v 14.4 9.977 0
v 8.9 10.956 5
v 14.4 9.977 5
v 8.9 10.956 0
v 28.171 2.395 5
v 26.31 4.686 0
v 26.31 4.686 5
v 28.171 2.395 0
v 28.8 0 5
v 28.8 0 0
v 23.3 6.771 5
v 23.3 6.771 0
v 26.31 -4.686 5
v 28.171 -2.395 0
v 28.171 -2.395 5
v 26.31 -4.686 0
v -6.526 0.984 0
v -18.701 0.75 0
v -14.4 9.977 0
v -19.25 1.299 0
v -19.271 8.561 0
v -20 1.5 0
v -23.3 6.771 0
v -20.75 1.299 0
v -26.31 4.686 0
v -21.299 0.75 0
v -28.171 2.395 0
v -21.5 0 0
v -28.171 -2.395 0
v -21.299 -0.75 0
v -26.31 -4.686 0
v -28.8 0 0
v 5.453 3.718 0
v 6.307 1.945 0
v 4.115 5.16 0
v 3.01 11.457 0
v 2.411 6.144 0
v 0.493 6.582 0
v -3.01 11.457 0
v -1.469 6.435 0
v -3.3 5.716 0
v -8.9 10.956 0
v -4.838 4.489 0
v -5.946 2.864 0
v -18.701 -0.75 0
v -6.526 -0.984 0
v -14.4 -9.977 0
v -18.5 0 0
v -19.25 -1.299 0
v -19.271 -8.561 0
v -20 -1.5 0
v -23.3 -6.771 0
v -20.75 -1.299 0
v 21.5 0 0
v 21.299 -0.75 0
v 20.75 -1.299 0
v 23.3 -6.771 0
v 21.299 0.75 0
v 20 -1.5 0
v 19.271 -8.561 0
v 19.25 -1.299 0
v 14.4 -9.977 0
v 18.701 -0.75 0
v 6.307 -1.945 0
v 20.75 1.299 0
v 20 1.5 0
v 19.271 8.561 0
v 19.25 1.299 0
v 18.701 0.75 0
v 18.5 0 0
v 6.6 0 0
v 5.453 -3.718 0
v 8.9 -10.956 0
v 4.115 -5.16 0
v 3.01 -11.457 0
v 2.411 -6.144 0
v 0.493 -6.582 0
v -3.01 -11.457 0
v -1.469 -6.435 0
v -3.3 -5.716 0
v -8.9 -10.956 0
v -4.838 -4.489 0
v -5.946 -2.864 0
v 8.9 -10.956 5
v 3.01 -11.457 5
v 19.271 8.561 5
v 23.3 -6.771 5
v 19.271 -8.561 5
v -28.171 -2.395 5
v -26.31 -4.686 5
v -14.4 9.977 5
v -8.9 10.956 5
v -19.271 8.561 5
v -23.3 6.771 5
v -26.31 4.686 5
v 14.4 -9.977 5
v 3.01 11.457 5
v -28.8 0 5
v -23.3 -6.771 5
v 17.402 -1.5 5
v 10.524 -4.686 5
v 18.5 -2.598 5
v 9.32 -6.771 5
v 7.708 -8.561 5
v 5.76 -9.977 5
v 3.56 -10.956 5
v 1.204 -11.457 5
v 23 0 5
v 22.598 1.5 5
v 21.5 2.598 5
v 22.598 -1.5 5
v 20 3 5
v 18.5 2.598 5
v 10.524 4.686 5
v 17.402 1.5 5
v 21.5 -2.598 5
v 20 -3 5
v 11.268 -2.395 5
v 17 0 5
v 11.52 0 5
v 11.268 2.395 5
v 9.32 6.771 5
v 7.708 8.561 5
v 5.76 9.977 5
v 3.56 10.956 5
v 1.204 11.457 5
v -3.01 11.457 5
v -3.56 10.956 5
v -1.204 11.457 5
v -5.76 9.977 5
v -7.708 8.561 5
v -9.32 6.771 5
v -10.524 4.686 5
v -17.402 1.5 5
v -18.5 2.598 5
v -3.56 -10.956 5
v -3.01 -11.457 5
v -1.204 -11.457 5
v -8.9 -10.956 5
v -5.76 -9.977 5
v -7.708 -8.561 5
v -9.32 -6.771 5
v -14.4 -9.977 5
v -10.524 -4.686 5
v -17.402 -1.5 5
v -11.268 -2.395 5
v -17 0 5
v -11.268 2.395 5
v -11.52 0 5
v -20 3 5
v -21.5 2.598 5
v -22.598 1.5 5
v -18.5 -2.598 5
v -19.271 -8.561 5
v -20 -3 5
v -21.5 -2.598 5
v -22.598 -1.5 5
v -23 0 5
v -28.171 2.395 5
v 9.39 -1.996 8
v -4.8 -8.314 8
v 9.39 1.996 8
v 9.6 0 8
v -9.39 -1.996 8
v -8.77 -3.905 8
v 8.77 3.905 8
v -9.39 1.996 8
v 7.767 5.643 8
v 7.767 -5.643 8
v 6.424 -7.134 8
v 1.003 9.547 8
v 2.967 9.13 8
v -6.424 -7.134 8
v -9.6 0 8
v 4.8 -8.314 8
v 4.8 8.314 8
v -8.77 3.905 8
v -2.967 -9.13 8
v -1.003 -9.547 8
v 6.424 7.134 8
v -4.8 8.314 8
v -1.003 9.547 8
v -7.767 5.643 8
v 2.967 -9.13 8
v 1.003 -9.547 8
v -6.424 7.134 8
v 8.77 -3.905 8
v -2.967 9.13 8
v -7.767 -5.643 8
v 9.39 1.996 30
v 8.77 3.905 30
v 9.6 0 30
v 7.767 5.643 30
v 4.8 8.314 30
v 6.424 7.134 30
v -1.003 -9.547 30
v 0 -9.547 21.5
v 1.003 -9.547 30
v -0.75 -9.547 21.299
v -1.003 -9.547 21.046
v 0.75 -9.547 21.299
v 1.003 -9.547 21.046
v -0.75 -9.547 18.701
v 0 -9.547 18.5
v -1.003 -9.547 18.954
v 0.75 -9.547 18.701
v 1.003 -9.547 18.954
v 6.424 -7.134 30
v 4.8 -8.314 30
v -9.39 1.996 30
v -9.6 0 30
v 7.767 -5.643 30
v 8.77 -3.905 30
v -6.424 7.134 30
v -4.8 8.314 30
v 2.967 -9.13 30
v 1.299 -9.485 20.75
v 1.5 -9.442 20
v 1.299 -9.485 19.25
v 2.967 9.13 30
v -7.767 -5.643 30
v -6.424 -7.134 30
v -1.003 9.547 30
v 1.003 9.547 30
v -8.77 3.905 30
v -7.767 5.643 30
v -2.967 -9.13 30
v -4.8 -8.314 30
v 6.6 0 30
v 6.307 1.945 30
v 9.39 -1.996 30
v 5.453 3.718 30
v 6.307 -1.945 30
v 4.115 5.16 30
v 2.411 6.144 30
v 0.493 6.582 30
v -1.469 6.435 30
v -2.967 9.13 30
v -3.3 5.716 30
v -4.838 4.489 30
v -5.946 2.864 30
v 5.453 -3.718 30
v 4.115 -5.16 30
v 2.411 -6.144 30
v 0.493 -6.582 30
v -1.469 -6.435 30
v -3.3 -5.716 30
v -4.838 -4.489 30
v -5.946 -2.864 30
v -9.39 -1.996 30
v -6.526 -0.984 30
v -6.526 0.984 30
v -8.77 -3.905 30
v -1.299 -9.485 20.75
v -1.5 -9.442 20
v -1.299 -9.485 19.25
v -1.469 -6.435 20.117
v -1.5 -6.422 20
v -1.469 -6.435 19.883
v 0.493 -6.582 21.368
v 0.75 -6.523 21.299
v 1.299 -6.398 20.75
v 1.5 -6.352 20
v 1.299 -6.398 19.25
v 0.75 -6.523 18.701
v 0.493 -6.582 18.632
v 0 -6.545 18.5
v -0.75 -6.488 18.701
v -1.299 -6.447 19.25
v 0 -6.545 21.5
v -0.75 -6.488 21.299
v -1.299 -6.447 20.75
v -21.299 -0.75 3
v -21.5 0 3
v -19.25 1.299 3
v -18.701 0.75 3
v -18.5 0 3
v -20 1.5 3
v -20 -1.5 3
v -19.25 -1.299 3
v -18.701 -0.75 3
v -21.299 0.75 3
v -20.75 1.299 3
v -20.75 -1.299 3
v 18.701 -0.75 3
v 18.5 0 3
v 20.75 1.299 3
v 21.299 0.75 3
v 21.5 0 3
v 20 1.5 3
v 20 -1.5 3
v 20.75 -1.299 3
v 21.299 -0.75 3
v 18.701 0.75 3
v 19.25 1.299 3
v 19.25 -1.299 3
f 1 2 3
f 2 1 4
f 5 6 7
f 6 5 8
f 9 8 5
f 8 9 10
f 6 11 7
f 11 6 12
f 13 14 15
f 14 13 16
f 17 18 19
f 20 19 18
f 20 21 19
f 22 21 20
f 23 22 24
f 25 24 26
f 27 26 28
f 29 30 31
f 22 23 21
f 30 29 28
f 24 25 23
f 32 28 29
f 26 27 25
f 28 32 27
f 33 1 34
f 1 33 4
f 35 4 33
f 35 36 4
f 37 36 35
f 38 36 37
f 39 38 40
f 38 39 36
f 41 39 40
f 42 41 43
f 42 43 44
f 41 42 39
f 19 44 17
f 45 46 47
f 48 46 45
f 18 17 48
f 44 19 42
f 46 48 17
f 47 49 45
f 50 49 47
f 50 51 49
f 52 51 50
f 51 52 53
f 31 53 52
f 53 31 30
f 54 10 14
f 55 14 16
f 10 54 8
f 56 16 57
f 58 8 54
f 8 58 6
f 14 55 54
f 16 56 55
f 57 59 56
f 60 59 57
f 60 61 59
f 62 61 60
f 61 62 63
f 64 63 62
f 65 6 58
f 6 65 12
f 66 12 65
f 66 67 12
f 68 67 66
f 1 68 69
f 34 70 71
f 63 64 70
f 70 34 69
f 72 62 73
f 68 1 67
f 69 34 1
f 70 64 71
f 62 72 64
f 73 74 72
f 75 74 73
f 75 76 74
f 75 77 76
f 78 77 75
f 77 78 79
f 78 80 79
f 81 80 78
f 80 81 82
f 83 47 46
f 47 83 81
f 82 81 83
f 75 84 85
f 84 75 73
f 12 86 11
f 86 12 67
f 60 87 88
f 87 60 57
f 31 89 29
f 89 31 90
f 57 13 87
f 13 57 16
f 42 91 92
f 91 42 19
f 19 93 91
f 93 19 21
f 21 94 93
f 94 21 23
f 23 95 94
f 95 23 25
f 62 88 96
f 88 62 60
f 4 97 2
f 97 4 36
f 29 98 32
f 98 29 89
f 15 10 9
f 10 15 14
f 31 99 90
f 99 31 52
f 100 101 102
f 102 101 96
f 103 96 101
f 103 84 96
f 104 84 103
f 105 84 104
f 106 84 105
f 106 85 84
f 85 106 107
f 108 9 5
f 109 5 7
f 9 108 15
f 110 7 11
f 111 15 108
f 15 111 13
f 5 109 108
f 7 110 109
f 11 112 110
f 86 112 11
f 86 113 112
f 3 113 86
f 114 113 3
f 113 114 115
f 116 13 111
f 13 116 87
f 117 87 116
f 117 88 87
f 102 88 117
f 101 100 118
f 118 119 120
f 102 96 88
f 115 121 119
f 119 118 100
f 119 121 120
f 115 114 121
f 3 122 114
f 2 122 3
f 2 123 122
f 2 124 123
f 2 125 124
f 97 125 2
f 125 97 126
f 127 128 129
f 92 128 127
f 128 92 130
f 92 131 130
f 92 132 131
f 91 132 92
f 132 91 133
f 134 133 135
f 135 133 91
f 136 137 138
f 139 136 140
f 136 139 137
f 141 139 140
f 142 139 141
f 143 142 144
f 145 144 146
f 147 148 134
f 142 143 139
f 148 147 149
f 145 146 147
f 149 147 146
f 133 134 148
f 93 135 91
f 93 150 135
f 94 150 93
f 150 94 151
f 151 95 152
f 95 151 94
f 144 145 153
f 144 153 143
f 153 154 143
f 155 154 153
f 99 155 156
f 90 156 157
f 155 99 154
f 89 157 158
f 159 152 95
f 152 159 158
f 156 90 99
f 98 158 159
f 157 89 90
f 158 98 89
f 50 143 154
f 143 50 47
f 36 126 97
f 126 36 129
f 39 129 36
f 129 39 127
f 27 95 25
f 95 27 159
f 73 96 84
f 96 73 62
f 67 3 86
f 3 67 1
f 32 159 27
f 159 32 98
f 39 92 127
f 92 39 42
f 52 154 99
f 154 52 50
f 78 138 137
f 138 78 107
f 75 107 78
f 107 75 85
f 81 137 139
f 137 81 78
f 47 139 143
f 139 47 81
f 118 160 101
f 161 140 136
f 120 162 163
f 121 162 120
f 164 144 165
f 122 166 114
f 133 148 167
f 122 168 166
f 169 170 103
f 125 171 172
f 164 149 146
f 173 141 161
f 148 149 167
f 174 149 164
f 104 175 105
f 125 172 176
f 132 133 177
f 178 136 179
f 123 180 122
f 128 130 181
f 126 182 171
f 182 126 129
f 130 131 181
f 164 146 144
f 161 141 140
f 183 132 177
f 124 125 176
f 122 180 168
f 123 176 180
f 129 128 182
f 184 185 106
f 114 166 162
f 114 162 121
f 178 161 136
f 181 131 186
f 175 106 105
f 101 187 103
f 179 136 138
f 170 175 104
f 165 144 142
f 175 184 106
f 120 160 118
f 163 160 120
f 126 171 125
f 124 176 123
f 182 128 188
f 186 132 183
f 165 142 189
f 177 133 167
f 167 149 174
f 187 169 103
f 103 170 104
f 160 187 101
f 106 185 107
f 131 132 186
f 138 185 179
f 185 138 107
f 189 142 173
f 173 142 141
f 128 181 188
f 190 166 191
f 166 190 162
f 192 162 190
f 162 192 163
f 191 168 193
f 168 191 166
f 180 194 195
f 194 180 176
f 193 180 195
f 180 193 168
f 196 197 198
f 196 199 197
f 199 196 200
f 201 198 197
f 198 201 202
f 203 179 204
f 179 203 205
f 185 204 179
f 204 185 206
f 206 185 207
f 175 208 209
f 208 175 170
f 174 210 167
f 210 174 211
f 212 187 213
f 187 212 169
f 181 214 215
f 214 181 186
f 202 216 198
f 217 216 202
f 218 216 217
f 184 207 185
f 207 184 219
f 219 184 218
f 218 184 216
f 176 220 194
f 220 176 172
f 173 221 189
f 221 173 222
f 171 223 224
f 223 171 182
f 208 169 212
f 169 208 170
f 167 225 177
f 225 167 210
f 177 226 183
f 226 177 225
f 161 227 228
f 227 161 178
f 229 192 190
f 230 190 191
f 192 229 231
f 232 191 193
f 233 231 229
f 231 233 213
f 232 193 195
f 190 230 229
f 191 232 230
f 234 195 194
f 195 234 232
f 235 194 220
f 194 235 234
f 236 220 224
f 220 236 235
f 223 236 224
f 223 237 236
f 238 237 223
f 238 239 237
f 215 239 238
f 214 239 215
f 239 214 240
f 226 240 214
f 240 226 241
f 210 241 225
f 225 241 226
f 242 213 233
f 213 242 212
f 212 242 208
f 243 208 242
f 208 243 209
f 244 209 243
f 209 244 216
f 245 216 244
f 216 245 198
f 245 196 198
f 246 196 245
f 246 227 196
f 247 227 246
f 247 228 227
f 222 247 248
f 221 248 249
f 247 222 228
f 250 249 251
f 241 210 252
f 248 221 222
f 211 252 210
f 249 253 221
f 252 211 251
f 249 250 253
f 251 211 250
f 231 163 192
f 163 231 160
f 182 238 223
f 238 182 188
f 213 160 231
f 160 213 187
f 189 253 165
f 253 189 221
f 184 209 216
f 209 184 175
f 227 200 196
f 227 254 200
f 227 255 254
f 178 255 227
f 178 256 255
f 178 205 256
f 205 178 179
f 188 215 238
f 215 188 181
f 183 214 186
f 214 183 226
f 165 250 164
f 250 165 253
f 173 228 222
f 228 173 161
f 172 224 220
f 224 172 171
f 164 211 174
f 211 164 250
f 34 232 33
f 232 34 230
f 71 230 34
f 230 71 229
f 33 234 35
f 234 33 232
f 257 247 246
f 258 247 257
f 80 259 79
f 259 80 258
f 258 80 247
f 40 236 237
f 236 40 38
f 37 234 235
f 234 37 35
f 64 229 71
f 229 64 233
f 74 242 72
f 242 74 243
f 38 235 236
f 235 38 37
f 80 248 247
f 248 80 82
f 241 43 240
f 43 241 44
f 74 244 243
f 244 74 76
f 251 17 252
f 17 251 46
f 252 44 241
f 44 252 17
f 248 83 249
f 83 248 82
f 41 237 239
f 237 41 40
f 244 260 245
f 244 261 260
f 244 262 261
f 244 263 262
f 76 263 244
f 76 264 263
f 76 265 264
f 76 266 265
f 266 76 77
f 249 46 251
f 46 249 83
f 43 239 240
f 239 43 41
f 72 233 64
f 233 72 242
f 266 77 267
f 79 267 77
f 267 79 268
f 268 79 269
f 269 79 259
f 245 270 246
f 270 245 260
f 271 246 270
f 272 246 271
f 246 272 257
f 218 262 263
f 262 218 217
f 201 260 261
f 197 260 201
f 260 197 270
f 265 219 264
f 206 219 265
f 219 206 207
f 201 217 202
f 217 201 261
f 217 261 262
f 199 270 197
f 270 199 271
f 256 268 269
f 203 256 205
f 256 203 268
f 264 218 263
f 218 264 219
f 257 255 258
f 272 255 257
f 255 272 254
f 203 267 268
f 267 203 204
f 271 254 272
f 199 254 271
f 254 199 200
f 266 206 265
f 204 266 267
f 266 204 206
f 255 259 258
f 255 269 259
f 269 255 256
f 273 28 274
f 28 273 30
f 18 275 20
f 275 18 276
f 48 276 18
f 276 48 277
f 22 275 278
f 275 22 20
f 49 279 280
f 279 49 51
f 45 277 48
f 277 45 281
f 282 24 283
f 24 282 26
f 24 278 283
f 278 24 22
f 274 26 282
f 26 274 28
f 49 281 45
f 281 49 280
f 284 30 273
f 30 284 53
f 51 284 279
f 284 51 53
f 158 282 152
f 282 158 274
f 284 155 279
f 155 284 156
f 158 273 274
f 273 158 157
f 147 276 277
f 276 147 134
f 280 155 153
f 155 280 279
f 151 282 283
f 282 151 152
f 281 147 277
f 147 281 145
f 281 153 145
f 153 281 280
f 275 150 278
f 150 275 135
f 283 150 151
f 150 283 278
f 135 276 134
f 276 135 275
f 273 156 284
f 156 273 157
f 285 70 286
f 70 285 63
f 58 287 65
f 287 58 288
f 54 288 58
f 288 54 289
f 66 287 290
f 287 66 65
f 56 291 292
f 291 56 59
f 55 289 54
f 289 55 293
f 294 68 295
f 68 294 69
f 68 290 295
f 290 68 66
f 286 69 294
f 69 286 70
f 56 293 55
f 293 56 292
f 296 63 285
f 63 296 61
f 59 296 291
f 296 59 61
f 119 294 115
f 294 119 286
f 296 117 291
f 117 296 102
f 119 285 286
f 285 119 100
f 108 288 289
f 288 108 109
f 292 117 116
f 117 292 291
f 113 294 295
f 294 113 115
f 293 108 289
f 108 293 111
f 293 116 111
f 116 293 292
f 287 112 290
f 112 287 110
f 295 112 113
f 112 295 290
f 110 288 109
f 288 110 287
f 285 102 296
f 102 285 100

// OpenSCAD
union() {
	difference() {
		difference() {
			difference() {
				difference() {
					union() {
						cylinder(h = 30, r = 9.6000000000);
						union() {
							scale(v = [3, 1.2000000000, 1]) {
								cylinder(h = 5, r = 9.6000000000);
							}
							translate(v = [0, 0, 5]) {
								cylinder(h = 3, r1 = 11.5200000000, r2 = 9.6000000000);
							}
						}
					}
					translate(v = [0, 0, -1]) {
						cylinder(h = 32, r = 6.6000000000);
					}
				}
				translate(v = [0, -5, 20]) {
					rotate(a = 90, v = [1, 0, 0]) {
						cylinder($fn = 12, h = 6, r = 1.5000000000);
					}
				}
			}
			translate(v = [-20, 0, 0]) {
				union() {
					cylinder($fn = 12, h = 5, r = 1.5000000000);
					translate(v = [0, 0, 3]) {
						cylinder($fn = 12, h = 2, r1 = 1.5000000000, r2 = 3);
					}
				}
			}
		}
		translate(v = [20, 0, 0]) {
			union() {
				cylinder($fn = 12, h = 5, r = 1.5000000000);
				translate(v = [0, 0, 3]) {
					cylinder($fn = 12, h = 2, r1 = 1.5000000000, r2 = 3);
				}
			}
		}
	}
}
